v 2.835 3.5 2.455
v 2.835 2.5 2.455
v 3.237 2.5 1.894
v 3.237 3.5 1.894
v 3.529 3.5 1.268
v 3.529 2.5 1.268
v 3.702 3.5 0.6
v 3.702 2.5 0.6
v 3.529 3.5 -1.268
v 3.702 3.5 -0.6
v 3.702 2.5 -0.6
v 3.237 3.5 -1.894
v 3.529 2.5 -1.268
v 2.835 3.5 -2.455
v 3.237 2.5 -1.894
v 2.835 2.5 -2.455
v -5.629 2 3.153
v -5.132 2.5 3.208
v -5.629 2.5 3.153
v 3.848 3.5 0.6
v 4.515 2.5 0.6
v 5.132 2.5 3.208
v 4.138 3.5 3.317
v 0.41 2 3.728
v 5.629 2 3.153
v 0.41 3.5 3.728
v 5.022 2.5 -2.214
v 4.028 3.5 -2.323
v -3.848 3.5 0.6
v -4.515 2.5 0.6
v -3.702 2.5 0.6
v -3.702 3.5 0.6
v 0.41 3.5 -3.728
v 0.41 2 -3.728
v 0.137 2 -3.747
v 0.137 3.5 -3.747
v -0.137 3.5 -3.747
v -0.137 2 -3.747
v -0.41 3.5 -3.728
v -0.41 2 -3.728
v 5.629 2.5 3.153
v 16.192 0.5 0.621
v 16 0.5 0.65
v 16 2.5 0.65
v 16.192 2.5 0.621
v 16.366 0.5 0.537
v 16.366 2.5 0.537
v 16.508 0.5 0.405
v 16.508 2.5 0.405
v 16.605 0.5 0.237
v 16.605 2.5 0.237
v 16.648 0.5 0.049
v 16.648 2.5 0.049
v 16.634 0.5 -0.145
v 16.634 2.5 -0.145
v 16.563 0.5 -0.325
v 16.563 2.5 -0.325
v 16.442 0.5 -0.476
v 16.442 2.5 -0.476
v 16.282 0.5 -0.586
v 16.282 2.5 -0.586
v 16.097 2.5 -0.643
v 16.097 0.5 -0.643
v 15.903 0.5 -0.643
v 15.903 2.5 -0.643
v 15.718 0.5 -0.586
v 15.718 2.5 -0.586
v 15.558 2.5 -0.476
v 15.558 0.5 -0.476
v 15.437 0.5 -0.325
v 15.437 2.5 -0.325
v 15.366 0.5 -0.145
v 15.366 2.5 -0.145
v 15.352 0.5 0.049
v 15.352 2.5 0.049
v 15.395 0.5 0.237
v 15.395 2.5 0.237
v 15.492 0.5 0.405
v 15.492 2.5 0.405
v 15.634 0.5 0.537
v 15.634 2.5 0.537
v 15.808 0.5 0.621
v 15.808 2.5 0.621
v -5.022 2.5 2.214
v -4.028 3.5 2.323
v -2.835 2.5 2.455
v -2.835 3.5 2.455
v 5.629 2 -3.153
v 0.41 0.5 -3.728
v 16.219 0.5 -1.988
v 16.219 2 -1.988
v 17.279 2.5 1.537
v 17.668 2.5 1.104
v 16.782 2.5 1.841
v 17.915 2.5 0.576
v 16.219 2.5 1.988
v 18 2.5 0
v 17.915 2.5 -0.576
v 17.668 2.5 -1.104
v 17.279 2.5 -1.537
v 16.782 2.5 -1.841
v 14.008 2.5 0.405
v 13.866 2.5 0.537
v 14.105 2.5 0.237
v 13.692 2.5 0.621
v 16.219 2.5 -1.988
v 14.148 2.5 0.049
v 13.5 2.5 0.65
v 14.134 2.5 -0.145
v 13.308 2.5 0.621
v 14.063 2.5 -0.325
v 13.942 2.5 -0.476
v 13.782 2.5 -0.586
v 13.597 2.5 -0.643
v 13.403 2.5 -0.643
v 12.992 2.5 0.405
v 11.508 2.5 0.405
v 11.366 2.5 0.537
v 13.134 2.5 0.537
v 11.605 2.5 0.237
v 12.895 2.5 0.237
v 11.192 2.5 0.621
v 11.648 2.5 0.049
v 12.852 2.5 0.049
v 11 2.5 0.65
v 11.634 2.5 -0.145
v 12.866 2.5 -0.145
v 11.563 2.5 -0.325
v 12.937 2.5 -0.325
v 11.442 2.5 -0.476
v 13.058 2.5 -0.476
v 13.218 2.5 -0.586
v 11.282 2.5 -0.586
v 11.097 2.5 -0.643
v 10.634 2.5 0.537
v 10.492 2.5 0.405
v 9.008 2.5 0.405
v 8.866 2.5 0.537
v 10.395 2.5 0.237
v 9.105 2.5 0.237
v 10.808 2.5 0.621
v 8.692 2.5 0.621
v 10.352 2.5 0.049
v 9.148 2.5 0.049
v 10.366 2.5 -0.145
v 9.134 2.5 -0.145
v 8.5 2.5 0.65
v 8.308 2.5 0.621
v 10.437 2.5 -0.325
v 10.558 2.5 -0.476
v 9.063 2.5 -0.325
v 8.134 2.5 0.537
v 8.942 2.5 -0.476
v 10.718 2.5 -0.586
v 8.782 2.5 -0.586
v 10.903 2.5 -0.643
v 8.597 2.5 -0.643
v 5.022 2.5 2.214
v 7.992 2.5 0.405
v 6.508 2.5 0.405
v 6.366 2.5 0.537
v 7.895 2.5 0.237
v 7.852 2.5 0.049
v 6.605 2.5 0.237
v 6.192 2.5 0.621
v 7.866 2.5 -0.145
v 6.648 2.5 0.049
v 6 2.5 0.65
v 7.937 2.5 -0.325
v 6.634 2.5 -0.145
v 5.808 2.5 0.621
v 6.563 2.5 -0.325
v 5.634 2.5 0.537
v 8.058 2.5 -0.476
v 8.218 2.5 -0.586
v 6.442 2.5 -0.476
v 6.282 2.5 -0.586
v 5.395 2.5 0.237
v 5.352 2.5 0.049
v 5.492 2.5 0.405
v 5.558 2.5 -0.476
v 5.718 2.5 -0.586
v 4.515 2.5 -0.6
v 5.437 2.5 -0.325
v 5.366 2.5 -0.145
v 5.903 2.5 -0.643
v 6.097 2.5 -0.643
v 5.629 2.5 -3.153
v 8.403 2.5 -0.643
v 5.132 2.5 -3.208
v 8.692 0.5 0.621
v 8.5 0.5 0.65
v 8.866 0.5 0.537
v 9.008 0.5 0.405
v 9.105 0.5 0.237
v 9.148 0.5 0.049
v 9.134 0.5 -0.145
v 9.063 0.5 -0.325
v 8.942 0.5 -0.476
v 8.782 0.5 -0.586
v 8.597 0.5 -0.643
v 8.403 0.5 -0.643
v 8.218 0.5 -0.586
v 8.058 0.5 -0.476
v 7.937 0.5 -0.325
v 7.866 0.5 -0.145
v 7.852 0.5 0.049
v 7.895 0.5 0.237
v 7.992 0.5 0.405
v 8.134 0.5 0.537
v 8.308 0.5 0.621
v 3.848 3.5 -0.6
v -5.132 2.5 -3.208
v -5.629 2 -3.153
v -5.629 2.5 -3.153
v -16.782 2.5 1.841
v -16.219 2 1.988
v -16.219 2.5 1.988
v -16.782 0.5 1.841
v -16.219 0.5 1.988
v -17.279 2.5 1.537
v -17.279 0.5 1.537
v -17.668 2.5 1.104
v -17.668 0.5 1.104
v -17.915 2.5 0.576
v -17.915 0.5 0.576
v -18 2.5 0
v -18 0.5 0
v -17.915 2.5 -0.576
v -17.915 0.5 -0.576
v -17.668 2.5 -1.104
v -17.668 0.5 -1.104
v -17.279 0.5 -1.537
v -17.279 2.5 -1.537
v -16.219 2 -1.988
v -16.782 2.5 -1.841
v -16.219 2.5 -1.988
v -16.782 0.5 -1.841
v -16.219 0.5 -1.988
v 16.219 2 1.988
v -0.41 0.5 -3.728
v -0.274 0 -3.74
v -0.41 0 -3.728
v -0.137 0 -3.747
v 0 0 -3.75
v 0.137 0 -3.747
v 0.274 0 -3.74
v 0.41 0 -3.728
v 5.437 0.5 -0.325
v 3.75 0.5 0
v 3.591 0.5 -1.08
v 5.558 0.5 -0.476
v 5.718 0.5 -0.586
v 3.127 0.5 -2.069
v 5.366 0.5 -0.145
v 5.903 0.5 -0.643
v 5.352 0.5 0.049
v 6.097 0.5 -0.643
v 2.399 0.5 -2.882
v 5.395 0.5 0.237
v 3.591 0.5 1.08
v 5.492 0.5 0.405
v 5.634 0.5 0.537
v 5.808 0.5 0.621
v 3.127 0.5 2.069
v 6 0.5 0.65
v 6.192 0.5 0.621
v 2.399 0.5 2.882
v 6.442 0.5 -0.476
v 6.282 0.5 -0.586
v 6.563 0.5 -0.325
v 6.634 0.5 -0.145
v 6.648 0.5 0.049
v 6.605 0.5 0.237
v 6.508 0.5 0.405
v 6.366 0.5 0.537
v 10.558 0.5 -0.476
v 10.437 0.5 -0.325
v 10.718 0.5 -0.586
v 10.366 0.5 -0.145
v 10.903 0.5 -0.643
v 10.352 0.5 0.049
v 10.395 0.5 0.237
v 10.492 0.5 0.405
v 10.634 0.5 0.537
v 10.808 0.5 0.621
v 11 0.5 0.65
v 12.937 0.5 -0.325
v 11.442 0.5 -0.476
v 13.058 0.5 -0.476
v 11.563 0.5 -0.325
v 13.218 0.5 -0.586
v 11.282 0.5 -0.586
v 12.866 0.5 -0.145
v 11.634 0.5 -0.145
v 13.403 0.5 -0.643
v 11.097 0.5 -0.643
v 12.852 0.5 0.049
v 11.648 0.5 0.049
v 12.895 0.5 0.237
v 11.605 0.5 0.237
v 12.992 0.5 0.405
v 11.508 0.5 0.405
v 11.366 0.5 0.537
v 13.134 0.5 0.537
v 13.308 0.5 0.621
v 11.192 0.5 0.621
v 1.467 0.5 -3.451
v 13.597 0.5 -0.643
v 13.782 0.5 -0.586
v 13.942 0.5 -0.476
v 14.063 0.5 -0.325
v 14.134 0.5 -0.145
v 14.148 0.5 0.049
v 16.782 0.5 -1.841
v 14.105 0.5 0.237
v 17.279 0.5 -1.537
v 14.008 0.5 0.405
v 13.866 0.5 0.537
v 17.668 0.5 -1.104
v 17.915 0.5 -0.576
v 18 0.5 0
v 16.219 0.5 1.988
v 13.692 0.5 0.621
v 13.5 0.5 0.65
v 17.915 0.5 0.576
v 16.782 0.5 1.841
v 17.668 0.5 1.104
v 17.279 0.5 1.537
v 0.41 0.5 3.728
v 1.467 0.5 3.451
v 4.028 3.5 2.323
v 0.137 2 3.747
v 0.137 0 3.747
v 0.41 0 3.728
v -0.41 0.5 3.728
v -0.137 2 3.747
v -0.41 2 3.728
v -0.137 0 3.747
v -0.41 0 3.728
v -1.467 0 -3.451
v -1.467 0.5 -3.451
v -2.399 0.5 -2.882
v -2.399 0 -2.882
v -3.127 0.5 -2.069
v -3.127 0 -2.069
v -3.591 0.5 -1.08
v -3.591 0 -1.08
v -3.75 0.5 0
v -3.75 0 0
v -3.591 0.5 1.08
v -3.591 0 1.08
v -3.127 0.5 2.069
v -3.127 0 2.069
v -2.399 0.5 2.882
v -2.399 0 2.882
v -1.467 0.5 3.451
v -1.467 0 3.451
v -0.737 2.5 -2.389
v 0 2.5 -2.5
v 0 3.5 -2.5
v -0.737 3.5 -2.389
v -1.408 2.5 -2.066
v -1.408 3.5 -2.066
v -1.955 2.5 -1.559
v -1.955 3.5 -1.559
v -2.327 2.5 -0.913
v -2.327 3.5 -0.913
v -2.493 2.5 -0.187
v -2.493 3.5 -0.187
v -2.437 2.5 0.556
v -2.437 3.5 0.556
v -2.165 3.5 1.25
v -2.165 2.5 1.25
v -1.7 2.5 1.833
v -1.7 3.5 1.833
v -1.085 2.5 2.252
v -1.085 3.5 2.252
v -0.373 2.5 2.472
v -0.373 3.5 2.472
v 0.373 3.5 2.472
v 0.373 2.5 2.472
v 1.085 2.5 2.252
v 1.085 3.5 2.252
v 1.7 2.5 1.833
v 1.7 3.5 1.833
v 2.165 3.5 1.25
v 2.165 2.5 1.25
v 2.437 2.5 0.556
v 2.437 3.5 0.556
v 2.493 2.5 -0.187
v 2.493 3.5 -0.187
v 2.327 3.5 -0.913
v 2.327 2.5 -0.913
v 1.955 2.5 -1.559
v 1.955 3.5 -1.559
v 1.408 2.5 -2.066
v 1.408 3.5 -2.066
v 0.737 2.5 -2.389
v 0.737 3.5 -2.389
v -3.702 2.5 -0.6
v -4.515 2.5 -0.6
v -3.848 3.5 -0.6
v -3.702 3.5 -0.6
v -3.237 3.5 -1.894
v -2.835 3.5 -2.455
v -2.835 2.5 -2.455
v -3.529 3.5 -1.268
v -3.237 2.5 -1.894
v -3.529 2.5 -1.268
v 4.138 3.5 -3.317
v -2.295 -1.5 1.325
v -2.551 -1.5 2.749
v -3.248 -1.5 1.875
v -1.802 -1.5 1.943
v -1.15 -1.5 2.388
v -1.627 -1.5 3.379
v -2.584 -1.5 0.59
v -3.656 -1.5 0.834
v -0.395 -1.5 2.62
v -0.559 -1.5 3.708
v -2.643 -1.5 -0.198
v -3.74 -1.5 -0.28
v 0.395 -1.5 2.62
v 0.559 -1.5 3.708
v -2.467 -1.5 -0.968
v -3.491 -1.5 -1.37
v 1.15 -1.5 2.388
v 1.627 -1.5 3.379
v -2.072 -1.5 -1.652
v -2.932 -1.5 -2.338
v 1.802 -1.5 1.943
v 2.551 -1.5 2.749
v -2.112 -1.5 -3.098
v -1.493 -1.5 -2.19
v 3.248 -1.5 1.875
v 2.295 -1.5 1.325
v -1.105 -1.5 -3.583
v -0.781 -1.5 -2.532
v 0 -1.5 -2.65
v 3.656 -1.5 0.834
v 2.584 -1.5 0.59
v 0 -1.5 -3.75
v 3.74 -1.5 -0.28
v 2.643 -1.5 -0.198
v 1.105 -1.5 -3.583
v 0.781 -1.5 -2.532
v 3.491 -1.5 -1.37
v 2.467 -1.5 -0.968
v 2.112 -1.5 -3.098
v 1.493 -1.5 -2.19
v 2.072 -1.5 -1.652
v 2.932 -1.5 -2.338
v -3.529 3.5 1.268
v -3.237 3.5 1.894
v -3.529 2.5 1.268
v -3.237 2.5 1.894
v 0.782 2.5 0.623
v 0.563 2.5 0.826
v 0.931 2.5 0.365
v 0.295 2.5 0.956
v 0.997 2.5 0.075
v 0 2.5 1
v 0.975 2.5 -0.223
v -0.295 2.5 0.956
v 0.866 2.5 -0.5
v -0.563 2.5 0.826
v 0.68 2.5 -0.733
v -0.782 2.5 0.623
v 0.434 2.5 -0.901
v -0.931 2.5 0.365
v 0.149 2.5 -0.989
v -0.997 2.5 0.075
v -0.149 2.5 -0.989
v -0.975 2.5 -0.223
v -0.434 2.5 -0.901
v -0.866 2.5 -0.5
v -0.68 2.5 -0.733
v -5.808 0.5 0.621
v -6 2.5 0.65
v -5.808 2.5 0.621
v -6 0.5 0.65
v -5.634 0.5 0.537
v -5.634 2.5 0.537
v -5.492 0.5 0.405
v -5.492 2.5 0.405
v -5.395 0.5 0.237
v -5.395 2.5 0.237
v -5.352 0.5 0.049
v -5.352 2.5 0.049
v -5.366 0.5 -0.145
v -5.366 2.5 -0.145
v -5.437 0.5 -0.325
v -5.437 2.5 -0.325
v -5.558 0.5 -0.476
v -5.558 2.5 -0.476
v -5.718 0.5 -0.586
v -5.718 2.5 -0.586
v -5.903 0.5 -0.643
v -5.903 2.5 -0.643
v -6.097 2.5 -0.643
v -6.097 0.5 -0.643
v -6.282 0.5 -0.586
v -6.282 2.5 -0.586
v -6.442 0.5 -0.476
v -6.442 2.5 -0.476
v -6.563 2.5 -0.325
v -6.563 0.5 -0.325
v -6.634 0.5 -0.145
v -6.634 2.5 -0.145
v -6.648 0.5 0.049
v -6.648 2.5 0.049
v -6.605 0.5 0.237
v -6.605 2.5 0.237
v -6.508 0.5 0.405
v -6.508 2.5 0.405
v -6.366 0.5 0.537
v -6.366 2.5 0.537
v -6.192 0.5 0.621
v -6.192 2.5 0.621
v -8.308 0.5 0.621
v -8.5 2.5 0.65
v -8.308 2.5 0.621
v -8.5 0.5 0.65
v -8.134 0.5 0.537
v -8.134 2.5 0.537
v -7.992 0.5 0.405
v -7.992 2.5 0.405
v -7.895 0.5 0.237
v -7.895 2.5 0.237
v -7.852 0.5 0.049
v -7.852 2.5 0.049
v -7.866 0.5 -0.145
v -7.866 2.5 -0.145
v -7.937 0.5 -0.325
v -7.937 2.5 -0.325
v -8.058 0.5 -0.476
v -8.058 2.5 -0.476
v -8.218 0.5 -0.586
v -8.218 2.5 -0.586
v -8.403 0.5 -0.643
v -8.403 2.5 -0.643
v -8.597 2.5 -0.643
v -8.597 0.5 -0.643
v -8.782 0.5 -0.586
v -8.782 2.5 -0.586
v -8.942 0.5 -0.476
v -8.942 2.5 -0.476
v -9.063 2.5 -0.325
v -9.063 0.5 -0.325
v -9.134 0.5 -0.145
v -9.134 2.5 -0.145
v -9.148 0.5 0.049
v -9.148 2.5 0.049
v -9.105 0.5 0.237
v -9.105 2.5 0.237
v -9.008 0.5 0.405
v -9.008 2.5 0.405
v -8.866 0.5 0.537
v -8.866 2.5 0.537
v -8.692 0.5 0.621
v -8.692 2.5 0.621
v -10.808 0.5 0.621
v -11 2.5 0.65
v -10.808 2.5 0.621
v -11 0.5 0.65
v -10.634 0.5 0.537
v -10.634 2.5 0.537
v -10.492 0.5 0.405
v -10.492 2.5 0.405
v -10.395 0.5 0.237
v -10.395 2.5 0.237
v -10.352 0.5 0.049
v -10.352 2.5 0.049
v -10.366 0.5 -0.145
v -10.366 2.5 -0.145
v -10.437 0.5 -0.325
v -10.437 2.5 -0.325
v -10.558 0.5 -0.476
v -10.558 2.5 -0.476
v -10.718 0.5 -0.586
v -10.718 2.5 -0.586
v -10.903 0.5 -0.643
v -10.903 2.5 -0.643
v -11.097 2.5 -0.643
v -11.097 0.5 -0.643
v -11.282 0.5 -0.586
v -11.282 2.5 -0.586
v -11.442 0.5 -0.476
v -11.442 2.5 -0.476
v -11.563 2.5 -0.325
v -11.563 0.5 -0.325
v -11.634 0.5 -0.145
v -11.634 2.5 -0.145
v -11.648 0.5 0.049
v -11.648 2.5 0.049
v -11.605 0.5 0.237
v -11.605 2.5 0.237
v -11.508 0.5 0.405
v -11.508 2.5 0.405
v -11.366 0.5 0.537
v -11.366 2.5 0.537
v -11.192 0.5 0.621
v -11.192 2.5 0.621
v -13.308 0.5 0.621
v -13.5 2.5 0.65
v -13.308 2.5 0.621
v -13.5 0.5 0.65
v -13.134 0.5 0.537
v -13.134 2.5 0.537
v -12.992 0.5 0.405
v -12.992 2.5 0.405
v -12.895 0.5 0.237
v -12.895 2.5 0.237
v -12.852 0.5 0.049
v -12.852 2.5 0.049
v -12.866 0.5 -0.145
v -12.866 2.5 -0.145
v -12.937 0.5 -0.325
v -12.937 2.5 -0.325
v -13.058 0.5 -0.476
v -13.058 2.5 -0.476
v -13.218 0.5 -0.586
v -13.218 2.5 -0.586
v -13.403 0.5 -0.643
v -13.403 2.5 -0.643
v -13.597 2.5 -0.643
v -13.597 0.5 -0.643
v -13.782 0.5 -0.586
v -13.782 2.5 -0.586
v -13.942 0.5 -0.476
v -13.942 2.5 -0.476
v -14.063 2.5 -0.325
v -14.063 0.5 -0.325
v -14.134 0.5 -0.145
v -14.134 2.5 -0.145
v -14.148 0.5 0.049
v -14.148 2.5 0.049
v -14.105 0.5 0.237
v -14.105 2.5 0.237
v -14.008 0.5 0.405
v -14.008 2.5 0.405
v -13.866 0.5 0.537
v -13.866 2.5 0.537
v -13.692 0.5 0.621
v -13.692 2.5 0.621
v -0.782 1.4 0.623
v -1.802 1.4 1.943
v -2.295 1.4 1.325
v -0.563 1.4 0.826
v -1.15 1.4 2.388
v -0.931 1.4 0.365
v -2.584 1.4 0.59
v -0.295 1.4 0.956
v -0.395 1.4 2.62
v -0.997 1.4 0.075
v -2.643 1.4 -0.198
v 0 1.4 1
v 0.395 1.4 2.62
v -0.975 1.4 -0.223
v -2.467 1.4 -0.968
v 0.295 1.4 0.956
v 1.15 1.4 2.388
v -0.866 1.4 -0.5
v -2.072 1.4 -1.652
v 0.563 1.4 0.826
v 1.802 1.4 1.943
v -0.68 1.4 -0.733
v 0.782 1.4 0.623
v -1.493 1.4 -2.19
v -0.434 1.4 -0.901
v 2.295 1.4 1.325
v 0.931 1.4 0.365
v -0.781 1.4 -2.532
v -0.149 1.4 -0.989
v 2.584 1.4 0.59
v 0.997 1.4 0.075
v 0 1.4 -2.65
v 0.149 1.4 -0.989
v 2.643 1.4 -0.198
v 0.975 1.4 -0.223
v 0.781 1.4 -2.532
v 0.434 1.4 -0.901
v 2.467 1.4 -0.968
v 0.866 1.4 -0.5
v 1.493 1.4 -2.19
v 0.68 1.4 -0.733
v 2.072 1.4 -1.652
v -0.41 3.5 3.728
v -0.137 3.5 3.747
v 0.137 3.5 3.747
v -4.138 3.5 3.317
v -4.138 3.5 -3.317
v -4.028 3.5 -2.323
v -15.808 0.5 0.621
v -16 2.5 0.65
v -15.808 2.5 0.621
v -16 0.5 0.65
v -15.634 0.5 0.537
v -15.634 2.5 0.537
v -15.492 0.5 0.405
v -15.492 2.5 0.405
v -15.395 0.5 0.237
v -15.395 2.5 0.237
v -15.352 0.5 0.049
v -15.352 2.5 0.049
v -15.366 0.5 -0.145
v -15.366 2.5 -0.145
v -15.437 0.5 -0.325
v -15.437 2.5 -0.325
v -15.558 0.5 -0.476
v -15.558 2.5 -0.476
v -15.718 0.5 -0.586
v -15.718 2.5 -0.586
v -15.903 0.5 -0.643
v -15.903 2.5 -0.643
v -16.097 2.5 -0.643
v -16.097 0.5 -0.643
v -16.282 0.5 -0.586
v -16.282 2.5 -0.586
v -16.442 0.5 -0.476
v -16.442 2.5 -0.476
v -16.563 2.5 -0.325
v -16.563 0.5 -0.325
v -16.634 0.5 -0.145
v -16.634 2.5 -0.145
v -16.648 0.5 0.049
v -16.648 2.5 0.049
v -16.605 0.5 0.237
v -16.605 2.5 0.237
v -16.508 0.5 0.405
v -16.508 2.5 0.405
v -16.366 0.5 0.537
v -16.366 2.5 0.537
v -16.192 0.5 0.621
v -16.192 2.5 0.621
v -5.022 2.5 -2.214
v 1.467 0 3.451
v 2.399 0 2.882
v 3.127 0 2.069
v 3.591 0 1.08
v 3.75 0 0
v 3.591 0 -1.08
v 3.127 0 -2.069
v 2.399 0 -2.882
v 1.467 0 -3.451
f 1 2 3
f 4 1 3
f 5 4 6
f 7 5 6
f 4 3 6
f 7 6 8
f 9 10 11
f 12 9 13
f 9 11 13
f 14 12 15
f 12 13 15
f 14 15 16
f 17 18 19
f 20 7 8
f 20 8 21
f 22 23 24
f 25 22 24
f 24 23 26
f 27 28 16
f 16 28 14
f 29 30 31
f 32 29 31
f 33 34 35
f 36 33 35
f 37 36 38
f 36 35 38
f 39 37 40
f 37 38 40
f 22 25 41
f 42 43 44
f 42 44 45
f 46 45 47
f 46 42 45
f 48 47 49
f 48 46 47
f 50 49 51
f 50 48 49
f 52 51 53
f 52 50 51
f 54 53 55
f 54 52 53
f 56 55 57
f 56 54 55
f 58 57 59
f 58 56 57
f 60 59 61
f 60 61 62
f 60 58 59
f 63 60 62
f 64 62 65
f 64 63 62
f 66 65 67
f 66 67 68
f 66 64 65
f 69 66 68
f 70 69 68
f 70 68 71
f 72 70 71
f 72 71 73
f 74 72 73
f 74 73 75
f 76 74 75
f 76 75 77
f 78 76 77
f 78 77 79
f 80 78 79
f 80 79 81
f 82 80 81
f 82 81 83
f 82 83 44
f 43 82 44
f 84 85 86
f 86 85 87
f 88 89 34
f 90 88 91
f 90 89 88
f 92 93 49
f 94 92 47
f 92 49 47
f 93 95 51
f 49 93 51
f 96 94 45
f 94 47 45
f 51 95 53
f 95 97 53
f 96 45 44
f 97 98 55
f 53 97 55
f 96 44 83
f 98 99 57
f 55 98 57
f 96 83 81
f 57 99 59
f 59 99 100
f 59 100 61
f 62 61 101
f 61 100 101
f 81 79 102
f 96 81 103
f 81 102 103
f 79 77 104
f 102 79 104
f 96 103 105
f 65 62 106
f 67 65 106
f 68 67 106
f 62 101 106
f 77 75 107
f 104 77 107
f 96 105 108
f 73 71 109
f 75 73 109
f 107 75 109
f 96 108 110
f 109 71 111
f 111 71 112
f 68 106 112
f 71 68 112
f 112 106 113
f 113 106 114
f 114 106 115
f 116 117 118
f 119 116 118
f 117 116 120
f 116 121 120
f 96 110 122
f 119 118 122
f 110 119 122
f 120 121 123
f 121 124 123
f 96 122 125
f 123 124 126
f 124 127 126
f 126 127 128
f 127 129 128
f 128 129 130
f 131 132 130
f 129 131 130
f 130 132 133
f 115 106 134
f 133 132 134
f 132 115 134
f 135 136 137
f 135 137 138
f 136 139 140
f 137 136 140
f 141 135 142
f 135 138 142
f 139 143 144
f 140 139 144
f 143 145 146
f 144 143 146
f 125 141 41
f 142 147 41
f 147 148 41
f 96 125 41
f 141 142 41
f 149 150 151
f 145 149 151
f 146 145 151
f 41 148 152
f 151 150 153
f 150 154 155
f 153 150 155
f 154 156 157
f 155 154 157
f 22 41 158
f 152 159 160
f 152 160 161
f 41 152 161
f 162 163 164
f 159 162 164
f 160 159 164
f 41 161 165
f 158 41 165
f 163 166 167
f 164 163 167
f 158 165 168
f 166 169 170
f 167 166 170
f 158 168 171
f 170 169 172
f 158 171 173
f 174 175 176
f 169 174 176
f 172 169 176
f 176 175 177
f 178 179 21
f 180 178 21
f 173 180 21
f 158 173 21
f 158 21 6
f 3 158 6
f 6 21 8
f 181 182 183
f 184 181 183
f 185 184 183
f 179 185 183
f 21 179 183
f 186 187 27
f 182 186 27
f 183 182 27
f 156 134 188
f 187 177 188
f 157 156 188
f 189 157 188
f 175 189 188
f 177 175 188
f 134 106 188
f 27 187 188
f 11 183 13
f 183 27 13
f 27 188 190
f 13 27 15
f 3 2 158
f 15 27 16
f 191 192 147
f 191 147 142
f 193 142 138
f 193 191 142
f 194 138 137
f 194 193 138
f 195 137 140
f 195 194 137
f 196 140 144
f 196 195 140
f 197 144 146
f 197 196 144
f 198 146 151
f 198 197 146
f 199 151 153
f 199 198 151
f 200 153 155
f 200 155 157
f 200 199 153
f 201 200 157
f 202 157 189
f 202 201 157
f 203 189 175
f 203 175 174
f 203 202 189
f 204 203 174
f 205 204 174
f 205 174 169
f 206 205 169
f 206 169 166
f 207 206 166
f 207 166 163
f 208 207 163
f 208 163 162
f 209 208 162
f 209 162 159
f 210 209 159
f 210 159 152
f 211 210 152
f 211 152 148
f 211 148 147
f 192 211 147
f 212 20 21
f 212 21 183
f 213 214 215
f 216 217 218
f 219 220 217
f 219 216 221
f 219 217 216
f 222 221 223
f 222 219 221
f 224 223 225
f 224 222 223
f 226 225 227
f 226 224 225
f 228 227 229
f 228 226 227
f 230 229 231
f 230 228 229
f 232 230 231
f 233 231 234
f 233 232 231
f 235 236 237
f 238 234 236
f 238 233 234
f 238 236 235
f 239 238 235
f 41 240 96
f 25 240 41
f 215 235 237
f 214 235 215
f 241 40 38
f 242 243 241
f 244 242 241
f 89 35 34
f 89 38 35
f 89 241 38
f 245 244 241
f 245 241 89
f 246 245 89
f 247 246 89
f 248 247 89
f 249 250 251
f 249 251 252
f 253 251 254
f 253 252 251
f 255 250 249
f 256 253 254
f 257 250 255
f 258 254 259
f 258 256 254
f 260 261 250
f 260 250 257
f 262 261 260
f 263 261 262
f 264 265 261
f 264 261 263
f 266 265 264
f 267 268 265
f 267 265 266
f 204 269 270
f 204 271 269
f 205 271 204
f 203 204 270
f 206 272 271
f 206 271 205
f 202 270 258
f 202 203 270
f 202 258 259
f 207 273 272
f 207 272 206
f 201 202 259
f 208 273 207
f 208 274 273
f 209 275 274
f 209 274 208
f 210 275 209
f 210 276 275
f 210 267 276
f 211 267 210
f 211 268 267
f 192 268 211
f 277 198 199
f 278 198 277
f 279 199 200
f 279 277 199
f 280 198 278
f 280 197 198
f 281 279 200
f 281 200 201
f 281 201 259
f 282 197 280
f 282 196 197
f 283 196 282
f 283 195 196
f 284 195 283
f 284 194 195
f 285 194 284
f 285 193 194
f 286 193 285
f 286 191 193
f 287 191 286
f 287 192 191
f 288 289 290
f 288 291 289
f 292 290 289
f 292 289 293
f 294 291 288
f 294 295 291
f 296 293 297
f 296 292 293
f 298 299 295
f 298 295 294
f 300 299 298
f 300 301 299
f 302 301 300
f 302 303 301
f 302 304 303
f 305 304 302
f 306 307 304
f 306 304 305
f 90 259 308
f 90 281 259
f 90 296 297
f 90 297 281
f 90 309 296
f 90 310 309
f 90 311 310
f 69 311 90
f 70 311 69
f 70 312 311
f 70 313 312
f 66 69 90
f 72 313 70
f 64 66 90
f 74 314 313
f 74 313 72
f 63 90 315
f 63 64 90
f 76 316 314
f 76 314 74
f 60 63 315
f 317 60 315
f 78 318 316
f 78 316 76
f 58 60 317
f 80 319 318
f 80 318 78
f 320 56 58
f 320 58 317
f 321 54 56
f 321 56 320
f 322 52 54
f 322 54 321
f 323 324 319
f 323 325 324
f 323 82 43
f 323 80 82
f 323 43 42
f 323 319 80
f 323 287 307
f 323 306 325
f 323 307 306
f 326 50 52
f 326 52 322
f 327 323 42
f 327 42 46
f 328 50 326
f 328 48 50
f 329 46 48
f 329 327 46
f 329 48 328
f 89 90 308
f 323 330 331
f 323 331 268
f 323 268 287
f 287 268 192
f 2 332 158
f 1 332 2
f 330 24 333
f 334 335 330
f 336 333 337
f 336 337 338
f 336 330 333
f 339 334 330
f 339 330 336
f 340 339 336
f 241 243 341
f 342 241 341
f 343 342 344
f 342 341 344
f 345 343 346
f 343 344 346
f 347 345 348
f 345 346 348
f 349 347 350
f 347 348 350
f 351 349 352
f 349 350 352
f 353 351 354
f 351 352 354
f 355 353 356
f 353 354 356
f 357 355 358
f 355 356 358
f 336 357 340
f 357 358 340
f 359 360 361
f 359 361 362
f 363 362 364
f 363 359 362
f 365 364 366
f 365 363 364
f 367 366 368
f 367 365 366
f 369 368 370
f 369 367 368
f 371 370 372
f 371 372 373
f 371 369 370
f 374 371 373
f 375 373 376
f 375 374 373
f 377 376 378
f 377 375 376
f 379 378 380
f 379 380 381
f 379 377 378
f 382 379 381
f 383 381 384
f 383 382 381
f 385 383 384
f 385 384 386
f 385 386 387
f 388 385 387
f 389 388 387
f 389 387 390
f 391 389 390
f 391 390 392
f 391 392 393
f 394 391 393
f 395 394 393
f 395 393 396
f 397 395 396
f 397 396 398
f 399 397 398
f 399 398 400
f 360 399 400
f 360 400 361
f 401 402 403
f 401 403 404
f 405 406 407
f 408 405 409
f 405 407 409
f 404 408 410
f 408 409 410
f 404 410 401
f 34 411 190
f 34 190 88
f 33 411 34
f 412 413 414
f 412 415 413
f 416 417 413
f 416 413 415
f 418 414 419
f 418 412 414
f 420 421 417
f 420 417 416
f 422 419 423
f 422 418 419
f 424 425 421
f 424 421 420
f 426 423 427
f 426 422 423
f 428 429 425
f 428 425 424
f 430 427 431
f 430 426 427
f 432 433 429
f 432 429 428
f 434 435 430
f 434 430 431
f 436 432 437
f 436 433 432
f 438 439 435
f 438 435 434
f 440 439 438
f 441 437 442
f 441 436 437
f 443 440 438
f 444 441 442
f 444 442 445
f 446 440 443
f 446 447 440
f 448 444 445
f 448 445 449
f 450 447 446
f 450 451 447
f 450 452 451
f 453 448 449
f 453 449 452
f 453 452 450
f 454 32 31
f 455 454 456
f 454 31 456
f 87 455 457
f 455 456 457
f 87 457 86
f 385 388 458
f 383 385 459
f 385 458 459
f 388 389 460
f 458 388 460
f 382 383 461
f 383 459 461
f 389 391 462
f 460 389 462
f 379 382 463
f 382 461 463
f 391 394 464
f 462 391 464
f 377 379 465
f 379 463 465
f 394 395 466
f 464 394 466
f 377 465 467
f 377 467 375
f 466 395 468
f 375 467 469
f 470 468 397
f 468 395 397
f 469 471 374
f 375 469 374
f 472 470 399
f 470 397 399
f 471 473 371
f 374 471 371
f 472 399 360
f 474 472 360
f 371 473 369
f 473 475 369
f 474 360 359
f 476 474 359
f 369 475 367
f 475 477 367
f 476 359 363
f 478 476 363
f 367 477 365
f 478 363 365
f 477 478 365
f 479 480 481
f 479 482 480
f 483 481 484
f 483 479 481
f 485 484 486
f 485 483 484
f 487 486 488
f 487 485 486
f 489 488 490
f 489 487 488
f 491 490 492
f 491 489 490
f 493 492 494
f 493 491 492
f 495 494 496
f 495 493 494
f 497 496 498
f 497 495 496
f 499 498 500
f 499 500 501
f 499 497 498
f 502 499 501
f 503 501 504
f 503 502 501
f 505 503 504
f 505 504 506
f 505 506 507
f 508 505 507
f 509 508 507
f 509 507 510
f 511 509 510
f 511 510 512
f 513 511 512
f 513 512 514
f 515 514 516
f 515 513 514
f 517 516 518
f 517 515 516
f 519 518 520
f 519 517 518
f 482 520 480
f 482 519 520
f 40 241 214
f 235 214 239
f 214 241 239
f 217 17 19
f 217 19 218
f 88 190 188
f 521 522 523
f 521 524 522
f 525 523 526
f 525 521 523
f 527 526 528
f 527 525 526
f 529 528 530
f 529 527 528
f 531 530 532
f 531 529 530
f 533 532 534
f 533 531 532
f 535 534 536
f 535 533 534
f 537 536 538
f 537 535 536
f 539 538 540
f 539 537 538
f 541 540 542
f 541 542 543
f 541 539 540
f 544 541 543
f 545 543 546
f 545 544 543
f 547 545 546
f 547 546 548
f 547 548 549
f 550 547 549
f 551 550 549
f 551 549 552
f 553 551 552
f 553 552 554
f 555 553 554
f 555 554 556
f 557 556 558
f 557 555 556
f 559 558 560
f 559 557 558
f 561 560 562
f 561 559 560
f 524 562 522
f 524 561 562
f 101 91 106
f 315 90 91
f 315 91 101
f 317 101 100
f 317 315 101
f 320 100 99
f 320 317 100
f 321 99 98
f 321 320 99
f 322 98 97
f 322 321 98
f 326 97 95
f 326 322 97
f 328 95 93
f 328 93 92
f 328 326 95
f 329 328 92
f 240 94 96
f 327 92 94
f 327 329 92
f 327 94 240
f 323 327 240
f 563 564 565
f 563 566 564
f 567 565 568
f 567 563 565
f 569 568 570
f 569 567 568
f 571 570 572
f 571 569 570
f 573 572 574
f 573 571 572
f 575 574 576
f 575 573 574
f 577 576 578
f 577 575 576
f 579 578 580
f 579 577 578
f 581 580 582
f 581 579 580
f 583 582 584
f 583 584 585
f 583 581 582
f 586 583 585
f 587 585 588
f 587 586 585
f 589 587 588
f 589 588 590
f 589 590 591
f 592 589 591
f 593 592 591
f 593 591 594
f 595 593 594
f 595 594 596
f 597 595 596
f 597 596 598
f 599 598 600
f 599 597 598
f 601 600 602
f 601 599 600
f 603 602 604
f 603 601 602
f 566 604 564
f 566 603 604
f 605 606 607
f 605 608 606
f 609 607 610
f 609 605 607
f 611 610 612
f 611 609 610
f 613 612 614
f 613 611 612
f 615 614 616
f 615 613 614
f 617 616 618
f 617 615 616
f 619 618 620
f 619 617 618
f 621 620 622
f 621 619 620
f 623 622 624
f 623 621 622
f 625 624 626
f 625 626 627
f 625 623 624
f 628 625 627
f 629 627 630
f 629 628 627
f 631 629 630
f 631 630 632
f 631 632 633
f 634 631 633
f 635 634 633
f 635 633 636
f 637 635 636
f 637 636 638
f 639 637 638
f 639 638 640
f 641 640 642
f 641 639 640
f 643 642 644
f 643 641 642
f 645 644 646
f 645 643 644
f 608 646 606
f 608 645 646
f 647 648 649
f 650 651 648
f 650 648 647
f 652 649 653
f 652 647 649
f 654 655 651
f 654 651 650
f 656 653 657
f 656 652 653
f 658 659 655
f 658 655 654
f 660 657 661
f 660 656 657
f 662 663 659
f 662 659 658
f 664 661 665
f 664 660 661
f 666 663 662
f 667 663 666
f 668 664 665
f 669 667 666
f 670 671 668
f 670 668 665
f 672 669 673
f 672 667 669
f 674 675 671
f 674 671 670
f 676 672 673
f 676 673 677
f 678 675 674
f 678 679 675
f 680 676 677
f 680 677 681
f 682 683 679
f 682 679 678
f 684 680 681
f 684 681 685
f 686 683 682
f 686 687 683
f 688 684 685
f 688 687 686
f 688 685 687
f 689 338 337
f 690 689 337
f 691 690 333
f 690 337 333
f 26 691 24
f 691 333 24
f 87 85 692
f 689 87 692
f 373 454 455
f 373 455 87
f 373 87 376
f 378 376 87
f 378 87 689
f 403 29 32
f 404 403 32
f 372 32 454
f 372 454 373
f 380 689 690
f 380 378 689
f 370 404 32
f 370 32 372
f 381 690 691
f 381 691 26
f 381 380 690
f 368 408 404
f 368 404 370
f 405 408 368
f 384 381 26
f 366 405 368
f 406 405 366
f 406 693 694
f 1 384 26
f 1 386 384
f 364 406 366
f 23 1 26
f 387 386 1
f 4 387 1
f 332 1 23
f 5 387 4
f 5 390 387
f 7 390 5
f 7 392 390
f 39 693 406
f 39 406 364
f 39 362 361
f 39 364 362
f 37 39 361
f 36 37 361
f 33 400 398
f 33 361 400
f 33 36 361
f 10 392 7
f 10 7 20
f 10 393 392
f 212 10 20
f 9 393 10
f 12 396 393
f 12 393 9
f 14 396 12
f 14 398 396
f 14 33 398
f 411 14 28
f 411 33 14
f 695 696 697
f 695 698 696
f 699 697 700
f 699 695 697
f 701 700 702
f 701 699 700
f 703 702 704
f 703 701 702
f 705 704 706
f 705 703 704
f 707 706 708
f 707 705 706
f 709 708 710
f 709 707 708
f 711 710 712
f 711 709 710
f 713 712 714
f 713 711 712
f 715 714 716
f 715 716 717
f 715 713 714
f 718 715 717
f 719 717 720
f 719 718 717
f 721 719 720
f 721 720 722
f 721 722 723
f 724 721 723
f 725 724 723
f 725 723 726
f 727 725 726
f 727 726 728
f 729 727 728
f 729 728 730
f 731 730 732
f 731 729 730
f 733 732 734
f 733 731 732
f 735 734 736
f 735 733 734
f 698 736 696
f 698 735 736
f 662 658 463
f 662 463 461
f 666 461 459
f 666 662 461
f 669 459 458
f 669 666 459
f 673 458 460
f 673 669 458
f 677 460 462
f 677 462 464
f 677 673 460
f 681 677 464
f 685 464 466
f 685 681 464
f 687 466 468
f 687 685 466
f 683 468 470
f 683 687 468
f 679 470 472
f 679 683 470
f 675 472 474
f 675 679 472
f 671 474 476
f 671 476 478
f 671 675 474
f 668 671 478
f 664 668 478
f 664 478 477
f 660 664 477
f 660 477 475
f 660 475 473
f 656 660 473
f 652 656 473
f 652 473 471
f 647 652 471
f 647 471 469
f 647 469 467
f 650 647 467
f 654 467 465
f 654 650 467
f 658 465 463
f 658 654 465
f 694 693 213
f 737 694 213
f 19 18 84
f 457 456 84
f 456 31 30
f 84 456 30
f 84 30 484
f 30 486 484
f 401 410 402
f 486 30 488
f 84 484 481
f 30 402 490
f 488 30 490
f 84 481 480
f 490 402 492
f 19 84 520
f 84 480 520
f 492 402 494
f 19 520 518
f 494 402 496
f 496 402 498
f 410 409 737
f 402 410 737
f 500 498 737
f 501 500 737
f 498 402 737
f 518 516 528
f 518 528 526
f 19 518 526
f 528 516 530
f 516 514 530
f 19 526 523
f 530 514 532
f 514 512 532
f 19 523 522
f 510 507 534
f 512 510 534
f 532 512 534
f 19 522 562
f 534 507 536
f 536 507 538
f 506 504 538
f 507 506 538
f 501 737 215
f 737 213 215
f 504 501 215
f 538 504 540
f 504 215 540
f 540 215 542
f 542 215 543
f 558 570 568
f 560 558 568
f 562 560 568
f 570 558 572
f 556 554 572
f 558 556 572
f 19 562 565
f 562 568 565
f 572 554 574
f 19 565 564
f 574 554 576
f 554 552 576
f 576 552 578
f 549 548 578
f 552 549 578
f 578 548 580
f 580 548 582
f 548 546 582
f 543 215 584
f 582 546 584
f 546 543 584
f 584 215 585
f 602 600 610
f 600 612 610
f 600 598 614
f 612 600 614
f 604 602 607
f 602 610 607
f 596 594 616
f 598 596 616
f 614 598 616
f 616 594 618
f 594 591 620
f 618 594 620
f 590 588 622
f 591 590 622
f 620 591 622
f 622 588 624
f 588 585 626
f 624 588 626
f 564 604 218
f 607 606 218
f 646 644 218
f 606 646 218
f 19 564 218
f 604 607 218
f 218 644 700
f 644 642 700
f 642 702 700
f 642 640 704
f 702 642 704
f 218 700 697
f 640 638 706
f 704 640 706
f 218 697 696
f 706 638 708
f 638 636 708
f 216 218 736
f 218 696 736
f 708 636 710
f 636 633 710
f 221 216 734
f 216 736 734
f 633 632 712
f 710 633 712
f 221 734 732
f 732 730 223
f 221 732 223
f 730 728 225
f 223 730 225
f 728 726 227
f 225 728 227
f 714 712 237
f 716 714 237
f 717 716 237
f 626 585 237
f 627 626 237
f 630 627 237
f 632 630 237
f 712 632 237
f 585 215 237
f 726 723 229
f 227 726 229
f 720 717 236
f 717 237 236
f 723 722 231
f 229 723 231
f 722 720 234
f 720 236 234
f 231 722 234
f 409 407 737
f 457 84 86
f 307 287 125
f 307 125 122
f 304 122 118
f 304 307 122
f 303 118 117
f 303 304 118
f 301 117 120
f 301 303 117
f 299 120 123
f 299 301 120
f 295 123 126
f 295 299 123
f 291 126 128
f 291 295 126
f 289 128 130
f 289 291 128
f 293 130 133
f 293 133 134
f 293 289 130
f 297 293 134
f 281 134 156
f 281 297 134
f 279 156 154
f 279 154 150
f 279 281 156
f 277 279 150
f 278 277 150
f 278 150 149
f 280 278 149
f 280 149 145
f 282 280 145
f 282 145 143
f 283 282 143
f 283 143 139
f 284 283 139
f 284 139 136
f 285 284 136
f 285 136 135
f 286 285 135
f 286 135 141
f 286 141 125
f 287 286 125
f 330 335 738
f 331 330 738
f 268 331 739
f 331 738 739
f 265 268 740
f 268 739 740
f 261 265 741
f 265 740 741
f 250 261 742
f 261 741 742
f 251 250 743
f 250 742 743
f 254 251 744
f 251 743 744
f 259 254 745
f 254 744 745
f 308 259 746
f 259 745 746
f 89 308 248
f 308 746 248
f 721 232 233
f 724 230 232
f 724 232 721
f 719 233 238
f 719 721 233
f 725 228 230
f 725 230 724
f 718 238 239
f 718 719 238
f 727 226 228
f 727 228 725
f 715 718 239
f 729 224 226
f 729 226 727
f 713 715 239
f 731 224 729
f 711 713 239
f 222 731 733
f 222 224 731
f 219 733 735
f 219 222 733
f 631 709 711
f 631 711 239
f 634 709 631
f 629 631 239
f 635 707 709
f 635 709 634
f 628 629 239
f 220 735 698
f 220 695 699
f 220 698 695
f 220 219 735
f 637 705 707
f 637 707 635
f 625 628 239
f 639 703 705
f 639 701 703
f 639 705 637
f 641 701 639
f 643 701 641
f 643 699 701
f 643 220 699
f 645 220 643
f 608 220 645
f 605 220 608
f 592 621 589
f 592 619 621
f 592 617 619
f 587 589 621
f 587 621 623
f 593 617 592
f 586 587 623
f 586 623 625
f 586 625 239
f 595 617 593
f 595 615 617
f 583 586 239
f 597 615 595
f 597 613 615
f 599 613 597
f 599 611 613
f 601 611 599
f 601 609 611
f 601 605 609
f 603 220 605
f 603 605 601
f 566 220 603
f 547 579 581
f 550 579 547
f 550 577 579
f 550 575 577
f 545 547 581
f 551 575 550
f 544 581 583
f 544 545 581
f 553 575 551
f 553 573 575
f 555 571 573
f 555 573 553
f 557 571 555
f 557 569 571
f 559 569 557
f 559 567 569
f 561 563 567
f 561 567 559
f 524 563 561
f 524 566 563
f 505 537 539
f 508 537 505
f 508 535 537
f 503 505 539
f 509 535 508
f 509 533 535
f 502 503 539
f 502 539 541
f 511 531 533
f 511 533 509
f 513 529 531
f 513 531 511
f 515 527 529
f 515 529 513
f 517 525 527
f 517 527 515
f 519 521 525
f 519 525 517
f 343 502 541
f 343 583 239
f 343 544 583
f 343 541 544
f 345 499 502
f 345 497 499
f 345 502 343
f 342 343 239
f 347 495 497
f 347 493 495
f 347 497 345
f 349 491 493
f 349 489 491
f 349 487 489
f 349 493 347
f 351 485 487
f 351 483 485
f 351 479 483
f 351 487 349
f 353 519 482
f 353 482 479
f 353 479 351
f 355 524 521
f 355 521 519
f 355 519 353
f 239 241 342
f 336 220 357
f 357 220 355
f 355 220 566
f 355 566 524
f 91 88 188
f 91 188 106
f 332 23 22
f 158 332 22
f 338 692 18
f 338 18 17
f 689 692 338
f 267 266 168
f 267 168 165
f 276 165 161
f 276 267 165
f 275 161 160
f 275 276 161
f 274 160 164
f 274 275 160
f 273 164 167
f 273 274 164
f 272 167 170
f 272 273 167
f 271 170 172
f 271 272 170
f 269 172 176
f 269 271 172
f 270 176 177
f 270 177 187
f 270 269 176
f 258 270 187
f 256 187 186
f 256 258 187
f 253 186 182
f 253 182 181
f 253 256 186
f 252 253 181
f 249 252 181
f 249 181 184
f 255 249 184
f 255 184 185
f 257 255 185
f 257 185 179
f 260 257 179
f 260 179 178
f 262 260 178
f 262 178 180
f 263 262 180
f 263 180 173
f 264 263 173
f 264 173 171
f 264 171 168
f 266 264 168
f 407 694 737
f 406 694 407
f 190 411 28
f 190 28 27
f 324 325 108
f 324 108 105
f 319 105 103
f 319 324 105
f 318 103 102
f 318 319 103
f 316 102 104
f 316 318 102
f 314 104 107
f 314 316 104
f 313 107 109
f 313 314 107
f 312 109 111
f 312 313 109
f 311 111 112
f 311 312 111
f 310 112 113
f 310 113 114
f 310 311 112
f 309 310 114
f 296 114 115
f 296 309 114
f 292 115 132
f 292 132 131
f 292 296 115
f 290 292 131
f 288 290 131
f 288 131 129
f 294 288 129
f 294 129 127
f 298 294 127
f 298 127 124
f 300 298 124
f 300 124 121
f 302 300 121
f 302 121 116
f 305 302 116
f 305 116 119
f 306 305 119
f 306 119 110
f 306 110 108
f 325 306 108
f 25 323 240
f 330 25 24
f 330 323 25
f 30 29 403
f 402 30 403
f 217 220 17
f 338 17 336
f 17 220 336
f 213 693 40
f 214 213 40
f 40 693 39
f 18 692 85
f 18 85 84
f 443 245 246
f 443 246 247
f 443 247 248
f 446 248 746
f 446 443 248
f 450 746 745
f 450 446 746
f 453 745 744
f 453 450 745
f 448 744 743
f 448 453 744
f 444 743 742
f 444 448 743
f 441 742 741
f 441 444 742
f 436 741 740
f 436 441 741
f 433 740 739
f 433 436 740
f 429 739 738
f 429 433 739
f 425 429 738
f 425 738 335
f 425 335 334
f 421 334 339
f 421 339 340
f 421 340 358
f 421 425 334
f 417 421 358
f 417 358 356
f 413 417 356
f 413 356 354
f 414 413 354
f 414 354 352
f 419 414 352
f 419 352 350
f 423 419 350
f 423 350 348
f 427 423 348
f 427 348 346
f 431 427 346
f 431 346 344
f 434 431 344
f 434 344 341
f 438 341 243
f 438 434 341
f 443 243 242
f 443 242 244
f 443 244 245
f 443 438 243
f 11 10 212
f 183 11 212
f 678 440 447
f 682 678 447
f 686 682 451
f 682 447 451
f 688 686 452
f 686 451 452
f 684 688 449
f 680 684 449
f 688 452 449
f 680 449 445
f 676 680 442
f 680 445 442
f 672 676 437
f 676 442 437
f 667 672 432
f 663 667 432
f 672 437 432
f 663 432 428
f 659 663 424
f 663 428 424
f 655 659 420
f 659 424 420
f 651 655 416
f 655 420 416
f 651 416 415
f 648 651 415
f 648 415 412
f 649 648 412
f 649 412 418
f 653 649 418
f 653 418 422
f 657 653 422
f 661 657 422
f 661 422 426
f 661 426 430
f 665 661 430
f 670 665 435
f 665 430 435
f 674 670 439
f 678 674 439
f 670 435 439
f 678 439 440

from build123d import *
from OCP.BRepFilletAPI import BRepFilletAPI_MakeChamfer
from build123d.topology import SkipClean

# Parameters (mm, degrees)
SKETCH_1_R            = 0.65
SKETCH_1_R_2          = 1
EXTRUDE_1_DEPTH       = 2
EXTRUDE_START         = 1.5
SKETCH_2_R            = 3.75
SKETCH_2_R_2          = 1
EXTRUDE_2_DEPTH       = 1.5
SKETCH_3_R            = 3.75
SKETCH_3_R_2          = 1
EXTRUDE_3_DEPTH       = 1.5
EXTRUDE_4_DEPTH       = 1
SKETCH_5_R            = 2.5
CUT_EXTRUDE_1_DEPTH   = 2.5
CUT_EXTRUDE_START     = -1.5
SKETCH_6_R            = 2.5
CUT_EXTRUDE_2_DEPTH   = 1.5
MIRROR_2_COPY_1_DEPTH = 1
SKETCH_7_W            = 2.19635709
SKETCH_7_H            = 1.2
EXTRUDE_5_DEPTH       = 1.5
CHAMFER_1_SIZE        = 1.5
CHAMFER_1_SIZE_2      = 1
SKETCH_8_R            = 1
SKETCH_8_R_2          = 0.65
EXTRUDE_6_DEPTH       = 0.5
CUT_EXTRUDE_3_DEPTH   = 0.5
SKETCH_10_R           = 2.5
CUT_EXTRUDE_4_DEPTH   = 1.4
SKETCH_11_R           = 2.65
CUT_EXTRUDE_5_DEPTH   = 2.9


with BuildPart() as part:
    # 草图1 → 凸台-拉伸1 (new body)
    with BuildSketch(Plane(origin=(0, 0, 0), x_dir=(1, 0, 0), z_dir=(0, 1, 0))):
        with BuildLine():
            Line((0.41015625, 3.727502093), (16.21875, 1.988001116))
            ThreePointArc((16.21875, 1.988001116), (18, 0), (16.21875, -1.988001116))
            Line((16.21875, -1.988001116), (0.41015625, -3.727502093))
            ThreePointArc((0.41015625, -3.727502093), (-3.75, 0), (0.41015625, 3.727502093))
        make_face()
        with Locations(Location((16, 0, 0), (0, 0, 270))):
            Circle(SKETCH_1_R, mode=Mode.SUBTRACT)
        with Locations(Location((6, 0, 0), (0, 0, 270))):
            Circle(SKETCH_1_R, mode=Mode.SUBTRACT)
        with Locations(Location((8.5, 0, 0), (0, 0, 270))):
            Circle(SKETCH_1_R, mode=Mode.SUBTRACT)
        with Locations(Location((11, 0, 0), (0, 0, 270))):
            Circle(SKETCH_1_R, mode=Mode.SUBTRACT)
        with Locations(Location((13.5, 0, 0), (0, 0, 270))):
            Circle(SKETCH_1_R, mode=Mode.SUBTRACT)
        with Locations(Location((0, 0, 0), (0, 0, 270))):
            Circle(SKETCH_1_R_2, mode=Mode.SUBTRACT)
    extrude_1 = extrude(amount=EXTRUDE_1_DEPTH)

    # 草图2 → 凸台-拉伸2 (add)
    with SkipClean():  # the faces are left unmerged after this step: merging them gives an invalid solid
        with BuildSketch(Plane.XZ.offset(EXTRUDE_START)):
            with Locations(Location((0, 0, 0), (0, 0, 270))):
                Circle(SKETCH_2_R)
            with Locations(Location((0, 0, 0), (0, 0, 270))):
                Circle(SKETCH_2_R_2, mode=Mode.SUBTRACT)
        extrude(amount=-EXTRUDE_2_DEPTH)

    # 草图3 → 凸台-拉伸3 (add)
    with SkipClean():  # the faces are left unmerged after this step: merging them gives an invalid solid
        with BuildSketch(Plane(origin=(0, 2, 0), x_dir=(1, 0, 0), z_dir=(0, 1, 0))):
            with Locations(Location((0, 0, 0), (0, 0, 90))):
                Circle(SKETCH_3_R)
            with Locations(Location((0, 0, 0), (0, 0, 90))):
                Circle(SKETCH_3_R_2, mode=Mode.SUBTRACT)
        extrude(amount=EXTRUDE_3_DEPTH)

    # 草图4 → 凸台-拉伸4 (add)
    with SkipClean():  # the faces are left unmerged after this step: merging them gives an invalid solid
        with BuildSketch(Plane(origin=(0.41015625, 0, 3.727502093), x_dir=(0.9940005580355578, 0, -0.10937499999999994), z_dir=(0.10937499999999994, 0, 0.9940005580355578))):
            Polygon((0, 2), (0, 3.5), (3.75, 3.5), (5.25, 2), align=None)
        extrude_4 = extrude(amount=-EXTRUDE_4_DEPTH)

    # 镜向1: 凸台-拉伸4 across plane
    with SkipClean():  # the faces are left unmerged after this step: merging them gives an invalid solid
        add(extrude_4.mirror(Plane.XY))

    # 草图5 → 切除-拉伸1 (cut)
    with SkipClean():  # the faces are left unmerged after this step: merging them gives an invalid solid
        with BuildSketch(Plane.XZ.offset(1.5)):
            with Locations(Location((0, 0, 0), (0, 0, 270))):
                Circle(SKETCH_5_R)
        extrude(amount=-CUT_EXTRUDE_1_DEPTH, mode=Mode.SUBTRACT)

    # 草图6 → 切除-拉伸2 (cut)
    with SkipClean():  # the faces are left unmerged after this step: merging them gives an invalid solid
        with BuildSketch(Plane(origin=(0, 3.5, 0), x_dir=(1, 0, 0), z_dir=(0, 1, 0)).offset(CUT_EXTRUDE_START)):
            with Locations(Location((0, 0, 0), (0, 0, 90))):
                Circle(SKETCH_6_R)
        extrude(amount=CUT_EXTRUDE_2_DEPTH, mode=Mode.SUBTRACT)

    # 镜向2: 凸台-拉伸1, 凸台-拉伸4 across plane
    with SkipClean():  # the faces are left unmerged after this step: merging them gives an invalid solid
        add(extrude_1.mirror(Plane(origin=(0, 0, 0), x_dir=(0, 0, 1), z_dir=(1, 0, 0))))
        add(extrude_4.mirror(Plane(origin=(0, 0, 0), x_dir=(0, 0, 1), z_dir=(1, 0, 0))))

    # 镜向2 copy 1 sketch → 镜向2 copy 1 (add)
    with SkipClean():  # the faces are left unmerged after this step: merging them gives an invalid solid
        with BuildSketch(Plane(origin=(-0.41015625, 0, -3.727502093), x_dir=(-0.9940005580355578, 0, 0.10937499999999994), z_dir=(-0.10937499999999994, 0, -0.9940005580355578))):
            Polygon((0, 2), (0, 3.5), (3.75, 3.5), (5.25, 2), align=None)
        extrude(amount=-MIRROR_2_COPY_1_DEPTH)

    # 草图7 → 凸台-拉伸5 (add)
    with SkipClean():  # the faces are left unmerged after this step: merging them gives an invalid solid
        with BuildSketch(Plane(origin=(0, 3.5, 0), x_dir=(1, 0, 0), z_dir=(0, 1, 0))):
            with Locations((3.75, 0)):
                Rectangle(SKETCH_7_W, SKETCH_7_H)
            with Locations((-3.75, 0)):
                Rectangle(SKETCH_7_W, SKETCH_7_H)
        extrude(amount=-EXTRUDE_5_DEPTH)

    # 倒角1
    chamfer_1_edges_1 = [part.edges().sort_by_distance(p)[0] for p in [
        (4.848178545, 3.5, 0),
    ]]
    chamfer_1_side_1 = [part.faces().sort_by_distance(p)[0] for p in [
        (4.848178545, 3.48, 0),
    ]]
    chamfer_1_edges_2 = [part.edges().sort_by_distance(p)[0] for p in [
        (-4.848178545, 3.5, 0),
    ]]
    chamfer_1_side_2 = [part.faces().sort_by_distance(p)[0] for p in [
        (-4.848178545, 3.48, 0),
    ]]
    chamfer_1 = BRepFilletAPI_MakeChamfer(part.part.solid().wrapped)
    for e in chamfer_1_edges_1:
        chamfer_1.Add(CHAMFER_1_SIZE - 0.0001, CHAMFER_1_SIZE_2 - 0.0001, e.wrapped, chamfer_1_side_1[0].wrapped)
    for e in chamfer_1_edges_2:
        chamfer_1.Add(CHAMFER_1_SIZE - 0.0001, CHAMFER_1_SIZE_2 - 0.0001, e.wrapped, chamfer_1_side_2[0].wrapped)
    add(Compound.cast(chamfer_1.Shape()), mode=Mode.REPLACE)  # a hair under: the kernel refuses the full size

    # 草图8 → 凸台-拉伸6 (add)
    with BuildSketch(Plane(origin=(0, 2, 0), x_dir=(1, 0, 0), z_dir=(0, 1, 0))):
        with BuildLine():
            Line((-5.62865918, -3.153283343), (-16.21875, -1.988001116))
            ThreePointArc((-16.21875, -1.988001116), (-18, 0), (-16.21875, 1.988001116))
            Line((-16.21875, 1.988001116), (-5.62865918, 3.153283343))
            Line((-5.62865918, 3.153283343), (-4.137658343, 3.317345843))
            Line((-4.137658343, 3.317345843), (-0.41015625, 3.727502093))
            ThreePointArc((-0.41015625, 3.727502093), (0, 3.75), (0.41015625, 3.727502093))
            Line((0.41015625, 3.727502093), (4.137658343, 3.317345843))
            Line((4.137658343, 3.317345843), (5.62865918, 3.153283343))
            Line((5.62865918, 3.153283343), (16.21875, 1.988001116))
            ThreePointArc((16.21875, 1.988001116), (18, 0), (16.21875, -1.988001116))
            Line((16.21875, -1.988001116), (5.62865918, -3.153283343))
            Line((5.62865918, -3.153283343), (4.137658343, -3.317345843))
            Line((4.137658343, -3.317345843), (0.41015625, -3.727502093))
            ThreePointArc((0.41015625, -3.727502093), (0, -3.75), (-0.41015625, -3.727502093))
            Line((-0.41015625, -3.727502093), (-4.137658343, -3.317345843))
            Line((-4.137658343, -3.317345843), (-5.62865918, -3.153283343))
        make_face()
        with Locations(Location((0, 0, 0), (0, 0, 270))):
            Circle(SKETCH_8_R, mode=Mode.SUBTRACT)
        with Locations(Location((16, 0, 0), (0, 0, 270))):
            Circle(SKETCH_8_R_2, mode=Mode.SUBTRACT)
        with Locations(Location((13.5, 0, 0), (0, 0, 270))):
            Circle(SKETCH_8_R_2, mode=Mode.SUBTRACT)
        with Locations(Location((11, 0, 0), (0, 0, 270))):
            Circle(SKETCH_8_R_2, mode=Mode.SUBTRACT)
        with Locations(Location((8.5, 0, 0), (0, 0, 270))):
            Circle(SKETCH_8_R_2, mode=Mode.SUBTRACT)
        with Locations(Location((6, 0, 0), (0, 0, 270))):
            Circle(SKETCH_8_R_2, mode=Mode.SUBTRACT)
        with Locations(Location((-6, 0, 0), (0, 0, 270))):
            Circle(SKETCH_8_R_2, mode=Mode.SUBTRACT)
        with Locations(Location((-8.5, 0, 0), (0, 0, 270))):
            Circle(SKETCH_8_R_2, mode=Mode.SUBTRACT)
        with Locations(Location((-11, 0, 0), (0, 0, 270))):
            Circle(SKETCH_8_R_2, mode=Mode.SUBTRACT)
        with Locations(Location((-13.5, 0, 0), (0, 0, 270))):
            Circle(SKETCH_8_R_2, mode=Mode.SUBTRACT)
        with Locations(Location((-16, 0, 0), (0, 0, 270))):
            Circle(SKETCH_8_R_2, mode=Mode.SUBTRACT)
    extrude(amount=EXTRUDE_6_DEPTH)

    # 草图9 → 切除-拉伸3 (cut)
    with BuildSketch(Plane.XZ):
        with BuildLine():
            Line((0.41015625, -3.727502093), (16.21875, -1.988001116))
            ThreePointArc((16.21875, -1.988001116), (18, 0), (16.21875, 1.988001116))
            Line((16.21875, 1.988001116), (0.41015625, 3.727502093))
            ThreePointArc((0.41015625, 3.727502093), (3.75, 0), (0.41015625, -3.727502093))
        make_face()
        with BuildLine():
            Line((-16.21875, -1.988001116), (-0.41015625, -3.727502093))
            ThreePointArc((-0.41015625, -3.727502093), (-3.75, 0), (-0.41015625, 3.727502093))
            Line((-0.41015625, 3.727502093), (-16.21875, 1.988001116))
            ThreePointArc((-16.21875, 1.988001116), (-18, 0), (-16.21875, -1.988001116))
        make_face()
    extrude(amount=-CUT_EXTRUDE_3_DEPTH, mode=Mode.SUBTRACT)

    # 草图10 → 切除-拉伸4 (cut)
    with BuildSketch(Plane.XZ):
        with Locations(Location((0, 0, 0), (0, 0, 270))):
            Circle(SKETCH_10_R)
    extrude(amount=-CUT_EXTRUDE_4_DEPTH, mode=Mode.SUBTRACT)

    # 草图11 → 切除-拉伸5 (cut)
    with BuildSketch(Plane.XZ.offset(1.5)):
        with Locations(Location((0, 0, 0), (0, 0, 270))):
            Circle(SKETCH_11_R)
    extrude(amount=-CUT_EXTRUDE_5_DEPTH, mode=Mode.SUBTRACT)


solid = part.part
